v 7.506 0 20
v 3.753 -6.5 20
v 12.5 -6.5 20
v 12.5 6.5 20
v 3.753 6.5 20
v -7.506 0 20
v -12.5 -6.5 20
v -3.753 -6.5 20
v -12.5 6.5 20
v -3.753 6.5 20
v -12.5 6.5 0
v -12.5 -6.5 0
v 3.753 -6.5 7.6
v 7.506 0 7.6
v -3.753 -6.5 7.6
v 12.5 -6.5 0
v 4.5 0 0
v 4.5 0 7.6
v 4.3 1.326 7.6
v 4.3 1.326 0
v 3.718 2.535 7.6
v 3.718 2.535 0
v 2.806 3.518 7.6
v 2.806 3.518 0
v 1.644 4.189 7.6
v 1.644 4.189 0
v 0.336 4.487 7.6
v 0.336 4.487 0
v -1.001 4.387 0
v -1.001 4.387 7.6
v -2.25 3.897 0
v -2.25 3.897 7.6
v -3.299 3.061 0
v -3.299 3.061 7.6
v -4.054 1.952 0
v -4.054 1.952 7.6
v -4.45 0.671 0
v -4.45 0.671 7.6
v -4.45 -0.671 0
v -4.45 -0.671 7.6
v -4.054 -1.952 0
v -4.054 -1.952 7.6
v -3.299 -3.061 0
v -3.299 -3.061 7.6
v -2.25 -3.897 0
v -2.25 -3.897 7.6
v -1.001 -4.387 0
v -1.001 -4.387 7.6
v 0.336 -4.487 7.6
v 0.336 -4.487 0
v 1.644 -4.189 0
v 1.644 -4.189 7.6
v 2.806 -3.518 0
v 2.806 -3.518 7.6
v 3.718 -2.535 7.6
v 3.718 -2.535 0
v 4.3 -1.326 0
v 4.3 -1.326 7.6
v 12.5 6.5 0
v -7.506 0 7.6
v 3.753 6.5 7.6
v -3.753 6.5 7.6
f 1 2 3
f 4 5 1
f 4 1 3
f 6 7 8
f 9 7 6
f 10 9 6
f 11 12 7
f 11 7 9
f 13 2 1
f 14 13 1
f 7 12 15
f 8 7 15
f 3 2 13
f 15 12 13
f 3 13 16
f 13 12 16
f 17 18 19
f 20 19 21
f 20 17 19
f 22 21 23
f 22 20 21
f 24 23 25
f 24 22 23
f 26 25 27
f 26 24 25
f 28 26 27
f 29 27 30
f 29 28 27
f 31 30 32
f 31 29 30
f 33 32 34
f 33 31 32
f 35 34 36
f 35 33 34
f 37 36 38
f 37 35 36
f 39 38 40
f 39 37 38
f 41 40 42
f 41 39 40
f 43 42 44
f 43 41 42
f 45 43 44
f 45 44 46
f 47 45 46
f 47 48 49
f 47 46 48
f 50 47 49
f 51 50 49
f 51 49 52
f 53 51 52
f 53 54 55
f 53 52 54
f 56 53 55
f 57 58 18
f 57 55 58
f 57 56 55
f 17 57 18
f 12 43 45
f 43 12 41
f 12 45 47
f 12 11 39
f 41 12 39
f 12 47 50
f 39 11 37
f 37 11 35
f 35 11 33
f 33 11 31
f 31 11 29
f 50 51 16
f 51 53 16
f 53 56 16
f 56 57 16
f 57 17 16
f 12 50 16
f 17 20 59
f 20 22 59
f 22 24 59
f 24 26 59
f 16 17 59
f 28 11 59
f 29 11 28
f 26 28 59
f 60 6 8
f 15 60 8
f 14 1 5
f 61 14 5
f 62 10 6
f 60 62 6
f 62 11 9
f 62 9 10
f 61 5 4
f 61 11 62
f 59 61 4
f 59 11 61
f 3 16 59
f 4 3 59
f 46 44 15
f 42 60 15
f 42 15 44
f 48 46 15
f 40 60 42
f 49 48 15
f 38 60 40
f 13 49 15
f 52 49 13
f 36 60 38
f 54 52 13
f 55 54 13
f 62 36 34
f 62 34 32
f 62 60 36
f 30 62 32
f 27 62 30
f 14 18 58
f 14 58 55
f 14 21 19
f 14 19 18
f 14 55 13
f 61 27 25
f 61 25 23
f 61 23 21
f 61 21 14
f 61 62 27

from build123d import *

# Parameters (mm, degrees)
SKETCH_W     = 25
SKETCH_H     = 13
SKETCH_R     = 4.5
PAD_DEPTH    = 20
POCKET_DEPTH = 12.4


with BuildPart() as part:
    # Sketch → Pad (new body)
    with BuildSketch(Plane.XY):
        Rectangle(SKETCH_W, SKETCH_H)
        Circle(SKETCH_R, mode=Mode.SUBTRACT)
    extrude(amount=PAD_DEPTH)

    # Sketch001 → Pocket (cut)
    with BuildSketch(Plane.XY.offset(20)):
        Polygon((-7.505554, 0), (-3.752777, -6.5), (3.752777, -6.5), (7.505554, 0), (3.752777, 6.5), (-3.752777, 6.5), align=None)
    extrude(amount=-POCKET_DEPTH, mode=Mode.SUBTRACT)


solid = part.part
